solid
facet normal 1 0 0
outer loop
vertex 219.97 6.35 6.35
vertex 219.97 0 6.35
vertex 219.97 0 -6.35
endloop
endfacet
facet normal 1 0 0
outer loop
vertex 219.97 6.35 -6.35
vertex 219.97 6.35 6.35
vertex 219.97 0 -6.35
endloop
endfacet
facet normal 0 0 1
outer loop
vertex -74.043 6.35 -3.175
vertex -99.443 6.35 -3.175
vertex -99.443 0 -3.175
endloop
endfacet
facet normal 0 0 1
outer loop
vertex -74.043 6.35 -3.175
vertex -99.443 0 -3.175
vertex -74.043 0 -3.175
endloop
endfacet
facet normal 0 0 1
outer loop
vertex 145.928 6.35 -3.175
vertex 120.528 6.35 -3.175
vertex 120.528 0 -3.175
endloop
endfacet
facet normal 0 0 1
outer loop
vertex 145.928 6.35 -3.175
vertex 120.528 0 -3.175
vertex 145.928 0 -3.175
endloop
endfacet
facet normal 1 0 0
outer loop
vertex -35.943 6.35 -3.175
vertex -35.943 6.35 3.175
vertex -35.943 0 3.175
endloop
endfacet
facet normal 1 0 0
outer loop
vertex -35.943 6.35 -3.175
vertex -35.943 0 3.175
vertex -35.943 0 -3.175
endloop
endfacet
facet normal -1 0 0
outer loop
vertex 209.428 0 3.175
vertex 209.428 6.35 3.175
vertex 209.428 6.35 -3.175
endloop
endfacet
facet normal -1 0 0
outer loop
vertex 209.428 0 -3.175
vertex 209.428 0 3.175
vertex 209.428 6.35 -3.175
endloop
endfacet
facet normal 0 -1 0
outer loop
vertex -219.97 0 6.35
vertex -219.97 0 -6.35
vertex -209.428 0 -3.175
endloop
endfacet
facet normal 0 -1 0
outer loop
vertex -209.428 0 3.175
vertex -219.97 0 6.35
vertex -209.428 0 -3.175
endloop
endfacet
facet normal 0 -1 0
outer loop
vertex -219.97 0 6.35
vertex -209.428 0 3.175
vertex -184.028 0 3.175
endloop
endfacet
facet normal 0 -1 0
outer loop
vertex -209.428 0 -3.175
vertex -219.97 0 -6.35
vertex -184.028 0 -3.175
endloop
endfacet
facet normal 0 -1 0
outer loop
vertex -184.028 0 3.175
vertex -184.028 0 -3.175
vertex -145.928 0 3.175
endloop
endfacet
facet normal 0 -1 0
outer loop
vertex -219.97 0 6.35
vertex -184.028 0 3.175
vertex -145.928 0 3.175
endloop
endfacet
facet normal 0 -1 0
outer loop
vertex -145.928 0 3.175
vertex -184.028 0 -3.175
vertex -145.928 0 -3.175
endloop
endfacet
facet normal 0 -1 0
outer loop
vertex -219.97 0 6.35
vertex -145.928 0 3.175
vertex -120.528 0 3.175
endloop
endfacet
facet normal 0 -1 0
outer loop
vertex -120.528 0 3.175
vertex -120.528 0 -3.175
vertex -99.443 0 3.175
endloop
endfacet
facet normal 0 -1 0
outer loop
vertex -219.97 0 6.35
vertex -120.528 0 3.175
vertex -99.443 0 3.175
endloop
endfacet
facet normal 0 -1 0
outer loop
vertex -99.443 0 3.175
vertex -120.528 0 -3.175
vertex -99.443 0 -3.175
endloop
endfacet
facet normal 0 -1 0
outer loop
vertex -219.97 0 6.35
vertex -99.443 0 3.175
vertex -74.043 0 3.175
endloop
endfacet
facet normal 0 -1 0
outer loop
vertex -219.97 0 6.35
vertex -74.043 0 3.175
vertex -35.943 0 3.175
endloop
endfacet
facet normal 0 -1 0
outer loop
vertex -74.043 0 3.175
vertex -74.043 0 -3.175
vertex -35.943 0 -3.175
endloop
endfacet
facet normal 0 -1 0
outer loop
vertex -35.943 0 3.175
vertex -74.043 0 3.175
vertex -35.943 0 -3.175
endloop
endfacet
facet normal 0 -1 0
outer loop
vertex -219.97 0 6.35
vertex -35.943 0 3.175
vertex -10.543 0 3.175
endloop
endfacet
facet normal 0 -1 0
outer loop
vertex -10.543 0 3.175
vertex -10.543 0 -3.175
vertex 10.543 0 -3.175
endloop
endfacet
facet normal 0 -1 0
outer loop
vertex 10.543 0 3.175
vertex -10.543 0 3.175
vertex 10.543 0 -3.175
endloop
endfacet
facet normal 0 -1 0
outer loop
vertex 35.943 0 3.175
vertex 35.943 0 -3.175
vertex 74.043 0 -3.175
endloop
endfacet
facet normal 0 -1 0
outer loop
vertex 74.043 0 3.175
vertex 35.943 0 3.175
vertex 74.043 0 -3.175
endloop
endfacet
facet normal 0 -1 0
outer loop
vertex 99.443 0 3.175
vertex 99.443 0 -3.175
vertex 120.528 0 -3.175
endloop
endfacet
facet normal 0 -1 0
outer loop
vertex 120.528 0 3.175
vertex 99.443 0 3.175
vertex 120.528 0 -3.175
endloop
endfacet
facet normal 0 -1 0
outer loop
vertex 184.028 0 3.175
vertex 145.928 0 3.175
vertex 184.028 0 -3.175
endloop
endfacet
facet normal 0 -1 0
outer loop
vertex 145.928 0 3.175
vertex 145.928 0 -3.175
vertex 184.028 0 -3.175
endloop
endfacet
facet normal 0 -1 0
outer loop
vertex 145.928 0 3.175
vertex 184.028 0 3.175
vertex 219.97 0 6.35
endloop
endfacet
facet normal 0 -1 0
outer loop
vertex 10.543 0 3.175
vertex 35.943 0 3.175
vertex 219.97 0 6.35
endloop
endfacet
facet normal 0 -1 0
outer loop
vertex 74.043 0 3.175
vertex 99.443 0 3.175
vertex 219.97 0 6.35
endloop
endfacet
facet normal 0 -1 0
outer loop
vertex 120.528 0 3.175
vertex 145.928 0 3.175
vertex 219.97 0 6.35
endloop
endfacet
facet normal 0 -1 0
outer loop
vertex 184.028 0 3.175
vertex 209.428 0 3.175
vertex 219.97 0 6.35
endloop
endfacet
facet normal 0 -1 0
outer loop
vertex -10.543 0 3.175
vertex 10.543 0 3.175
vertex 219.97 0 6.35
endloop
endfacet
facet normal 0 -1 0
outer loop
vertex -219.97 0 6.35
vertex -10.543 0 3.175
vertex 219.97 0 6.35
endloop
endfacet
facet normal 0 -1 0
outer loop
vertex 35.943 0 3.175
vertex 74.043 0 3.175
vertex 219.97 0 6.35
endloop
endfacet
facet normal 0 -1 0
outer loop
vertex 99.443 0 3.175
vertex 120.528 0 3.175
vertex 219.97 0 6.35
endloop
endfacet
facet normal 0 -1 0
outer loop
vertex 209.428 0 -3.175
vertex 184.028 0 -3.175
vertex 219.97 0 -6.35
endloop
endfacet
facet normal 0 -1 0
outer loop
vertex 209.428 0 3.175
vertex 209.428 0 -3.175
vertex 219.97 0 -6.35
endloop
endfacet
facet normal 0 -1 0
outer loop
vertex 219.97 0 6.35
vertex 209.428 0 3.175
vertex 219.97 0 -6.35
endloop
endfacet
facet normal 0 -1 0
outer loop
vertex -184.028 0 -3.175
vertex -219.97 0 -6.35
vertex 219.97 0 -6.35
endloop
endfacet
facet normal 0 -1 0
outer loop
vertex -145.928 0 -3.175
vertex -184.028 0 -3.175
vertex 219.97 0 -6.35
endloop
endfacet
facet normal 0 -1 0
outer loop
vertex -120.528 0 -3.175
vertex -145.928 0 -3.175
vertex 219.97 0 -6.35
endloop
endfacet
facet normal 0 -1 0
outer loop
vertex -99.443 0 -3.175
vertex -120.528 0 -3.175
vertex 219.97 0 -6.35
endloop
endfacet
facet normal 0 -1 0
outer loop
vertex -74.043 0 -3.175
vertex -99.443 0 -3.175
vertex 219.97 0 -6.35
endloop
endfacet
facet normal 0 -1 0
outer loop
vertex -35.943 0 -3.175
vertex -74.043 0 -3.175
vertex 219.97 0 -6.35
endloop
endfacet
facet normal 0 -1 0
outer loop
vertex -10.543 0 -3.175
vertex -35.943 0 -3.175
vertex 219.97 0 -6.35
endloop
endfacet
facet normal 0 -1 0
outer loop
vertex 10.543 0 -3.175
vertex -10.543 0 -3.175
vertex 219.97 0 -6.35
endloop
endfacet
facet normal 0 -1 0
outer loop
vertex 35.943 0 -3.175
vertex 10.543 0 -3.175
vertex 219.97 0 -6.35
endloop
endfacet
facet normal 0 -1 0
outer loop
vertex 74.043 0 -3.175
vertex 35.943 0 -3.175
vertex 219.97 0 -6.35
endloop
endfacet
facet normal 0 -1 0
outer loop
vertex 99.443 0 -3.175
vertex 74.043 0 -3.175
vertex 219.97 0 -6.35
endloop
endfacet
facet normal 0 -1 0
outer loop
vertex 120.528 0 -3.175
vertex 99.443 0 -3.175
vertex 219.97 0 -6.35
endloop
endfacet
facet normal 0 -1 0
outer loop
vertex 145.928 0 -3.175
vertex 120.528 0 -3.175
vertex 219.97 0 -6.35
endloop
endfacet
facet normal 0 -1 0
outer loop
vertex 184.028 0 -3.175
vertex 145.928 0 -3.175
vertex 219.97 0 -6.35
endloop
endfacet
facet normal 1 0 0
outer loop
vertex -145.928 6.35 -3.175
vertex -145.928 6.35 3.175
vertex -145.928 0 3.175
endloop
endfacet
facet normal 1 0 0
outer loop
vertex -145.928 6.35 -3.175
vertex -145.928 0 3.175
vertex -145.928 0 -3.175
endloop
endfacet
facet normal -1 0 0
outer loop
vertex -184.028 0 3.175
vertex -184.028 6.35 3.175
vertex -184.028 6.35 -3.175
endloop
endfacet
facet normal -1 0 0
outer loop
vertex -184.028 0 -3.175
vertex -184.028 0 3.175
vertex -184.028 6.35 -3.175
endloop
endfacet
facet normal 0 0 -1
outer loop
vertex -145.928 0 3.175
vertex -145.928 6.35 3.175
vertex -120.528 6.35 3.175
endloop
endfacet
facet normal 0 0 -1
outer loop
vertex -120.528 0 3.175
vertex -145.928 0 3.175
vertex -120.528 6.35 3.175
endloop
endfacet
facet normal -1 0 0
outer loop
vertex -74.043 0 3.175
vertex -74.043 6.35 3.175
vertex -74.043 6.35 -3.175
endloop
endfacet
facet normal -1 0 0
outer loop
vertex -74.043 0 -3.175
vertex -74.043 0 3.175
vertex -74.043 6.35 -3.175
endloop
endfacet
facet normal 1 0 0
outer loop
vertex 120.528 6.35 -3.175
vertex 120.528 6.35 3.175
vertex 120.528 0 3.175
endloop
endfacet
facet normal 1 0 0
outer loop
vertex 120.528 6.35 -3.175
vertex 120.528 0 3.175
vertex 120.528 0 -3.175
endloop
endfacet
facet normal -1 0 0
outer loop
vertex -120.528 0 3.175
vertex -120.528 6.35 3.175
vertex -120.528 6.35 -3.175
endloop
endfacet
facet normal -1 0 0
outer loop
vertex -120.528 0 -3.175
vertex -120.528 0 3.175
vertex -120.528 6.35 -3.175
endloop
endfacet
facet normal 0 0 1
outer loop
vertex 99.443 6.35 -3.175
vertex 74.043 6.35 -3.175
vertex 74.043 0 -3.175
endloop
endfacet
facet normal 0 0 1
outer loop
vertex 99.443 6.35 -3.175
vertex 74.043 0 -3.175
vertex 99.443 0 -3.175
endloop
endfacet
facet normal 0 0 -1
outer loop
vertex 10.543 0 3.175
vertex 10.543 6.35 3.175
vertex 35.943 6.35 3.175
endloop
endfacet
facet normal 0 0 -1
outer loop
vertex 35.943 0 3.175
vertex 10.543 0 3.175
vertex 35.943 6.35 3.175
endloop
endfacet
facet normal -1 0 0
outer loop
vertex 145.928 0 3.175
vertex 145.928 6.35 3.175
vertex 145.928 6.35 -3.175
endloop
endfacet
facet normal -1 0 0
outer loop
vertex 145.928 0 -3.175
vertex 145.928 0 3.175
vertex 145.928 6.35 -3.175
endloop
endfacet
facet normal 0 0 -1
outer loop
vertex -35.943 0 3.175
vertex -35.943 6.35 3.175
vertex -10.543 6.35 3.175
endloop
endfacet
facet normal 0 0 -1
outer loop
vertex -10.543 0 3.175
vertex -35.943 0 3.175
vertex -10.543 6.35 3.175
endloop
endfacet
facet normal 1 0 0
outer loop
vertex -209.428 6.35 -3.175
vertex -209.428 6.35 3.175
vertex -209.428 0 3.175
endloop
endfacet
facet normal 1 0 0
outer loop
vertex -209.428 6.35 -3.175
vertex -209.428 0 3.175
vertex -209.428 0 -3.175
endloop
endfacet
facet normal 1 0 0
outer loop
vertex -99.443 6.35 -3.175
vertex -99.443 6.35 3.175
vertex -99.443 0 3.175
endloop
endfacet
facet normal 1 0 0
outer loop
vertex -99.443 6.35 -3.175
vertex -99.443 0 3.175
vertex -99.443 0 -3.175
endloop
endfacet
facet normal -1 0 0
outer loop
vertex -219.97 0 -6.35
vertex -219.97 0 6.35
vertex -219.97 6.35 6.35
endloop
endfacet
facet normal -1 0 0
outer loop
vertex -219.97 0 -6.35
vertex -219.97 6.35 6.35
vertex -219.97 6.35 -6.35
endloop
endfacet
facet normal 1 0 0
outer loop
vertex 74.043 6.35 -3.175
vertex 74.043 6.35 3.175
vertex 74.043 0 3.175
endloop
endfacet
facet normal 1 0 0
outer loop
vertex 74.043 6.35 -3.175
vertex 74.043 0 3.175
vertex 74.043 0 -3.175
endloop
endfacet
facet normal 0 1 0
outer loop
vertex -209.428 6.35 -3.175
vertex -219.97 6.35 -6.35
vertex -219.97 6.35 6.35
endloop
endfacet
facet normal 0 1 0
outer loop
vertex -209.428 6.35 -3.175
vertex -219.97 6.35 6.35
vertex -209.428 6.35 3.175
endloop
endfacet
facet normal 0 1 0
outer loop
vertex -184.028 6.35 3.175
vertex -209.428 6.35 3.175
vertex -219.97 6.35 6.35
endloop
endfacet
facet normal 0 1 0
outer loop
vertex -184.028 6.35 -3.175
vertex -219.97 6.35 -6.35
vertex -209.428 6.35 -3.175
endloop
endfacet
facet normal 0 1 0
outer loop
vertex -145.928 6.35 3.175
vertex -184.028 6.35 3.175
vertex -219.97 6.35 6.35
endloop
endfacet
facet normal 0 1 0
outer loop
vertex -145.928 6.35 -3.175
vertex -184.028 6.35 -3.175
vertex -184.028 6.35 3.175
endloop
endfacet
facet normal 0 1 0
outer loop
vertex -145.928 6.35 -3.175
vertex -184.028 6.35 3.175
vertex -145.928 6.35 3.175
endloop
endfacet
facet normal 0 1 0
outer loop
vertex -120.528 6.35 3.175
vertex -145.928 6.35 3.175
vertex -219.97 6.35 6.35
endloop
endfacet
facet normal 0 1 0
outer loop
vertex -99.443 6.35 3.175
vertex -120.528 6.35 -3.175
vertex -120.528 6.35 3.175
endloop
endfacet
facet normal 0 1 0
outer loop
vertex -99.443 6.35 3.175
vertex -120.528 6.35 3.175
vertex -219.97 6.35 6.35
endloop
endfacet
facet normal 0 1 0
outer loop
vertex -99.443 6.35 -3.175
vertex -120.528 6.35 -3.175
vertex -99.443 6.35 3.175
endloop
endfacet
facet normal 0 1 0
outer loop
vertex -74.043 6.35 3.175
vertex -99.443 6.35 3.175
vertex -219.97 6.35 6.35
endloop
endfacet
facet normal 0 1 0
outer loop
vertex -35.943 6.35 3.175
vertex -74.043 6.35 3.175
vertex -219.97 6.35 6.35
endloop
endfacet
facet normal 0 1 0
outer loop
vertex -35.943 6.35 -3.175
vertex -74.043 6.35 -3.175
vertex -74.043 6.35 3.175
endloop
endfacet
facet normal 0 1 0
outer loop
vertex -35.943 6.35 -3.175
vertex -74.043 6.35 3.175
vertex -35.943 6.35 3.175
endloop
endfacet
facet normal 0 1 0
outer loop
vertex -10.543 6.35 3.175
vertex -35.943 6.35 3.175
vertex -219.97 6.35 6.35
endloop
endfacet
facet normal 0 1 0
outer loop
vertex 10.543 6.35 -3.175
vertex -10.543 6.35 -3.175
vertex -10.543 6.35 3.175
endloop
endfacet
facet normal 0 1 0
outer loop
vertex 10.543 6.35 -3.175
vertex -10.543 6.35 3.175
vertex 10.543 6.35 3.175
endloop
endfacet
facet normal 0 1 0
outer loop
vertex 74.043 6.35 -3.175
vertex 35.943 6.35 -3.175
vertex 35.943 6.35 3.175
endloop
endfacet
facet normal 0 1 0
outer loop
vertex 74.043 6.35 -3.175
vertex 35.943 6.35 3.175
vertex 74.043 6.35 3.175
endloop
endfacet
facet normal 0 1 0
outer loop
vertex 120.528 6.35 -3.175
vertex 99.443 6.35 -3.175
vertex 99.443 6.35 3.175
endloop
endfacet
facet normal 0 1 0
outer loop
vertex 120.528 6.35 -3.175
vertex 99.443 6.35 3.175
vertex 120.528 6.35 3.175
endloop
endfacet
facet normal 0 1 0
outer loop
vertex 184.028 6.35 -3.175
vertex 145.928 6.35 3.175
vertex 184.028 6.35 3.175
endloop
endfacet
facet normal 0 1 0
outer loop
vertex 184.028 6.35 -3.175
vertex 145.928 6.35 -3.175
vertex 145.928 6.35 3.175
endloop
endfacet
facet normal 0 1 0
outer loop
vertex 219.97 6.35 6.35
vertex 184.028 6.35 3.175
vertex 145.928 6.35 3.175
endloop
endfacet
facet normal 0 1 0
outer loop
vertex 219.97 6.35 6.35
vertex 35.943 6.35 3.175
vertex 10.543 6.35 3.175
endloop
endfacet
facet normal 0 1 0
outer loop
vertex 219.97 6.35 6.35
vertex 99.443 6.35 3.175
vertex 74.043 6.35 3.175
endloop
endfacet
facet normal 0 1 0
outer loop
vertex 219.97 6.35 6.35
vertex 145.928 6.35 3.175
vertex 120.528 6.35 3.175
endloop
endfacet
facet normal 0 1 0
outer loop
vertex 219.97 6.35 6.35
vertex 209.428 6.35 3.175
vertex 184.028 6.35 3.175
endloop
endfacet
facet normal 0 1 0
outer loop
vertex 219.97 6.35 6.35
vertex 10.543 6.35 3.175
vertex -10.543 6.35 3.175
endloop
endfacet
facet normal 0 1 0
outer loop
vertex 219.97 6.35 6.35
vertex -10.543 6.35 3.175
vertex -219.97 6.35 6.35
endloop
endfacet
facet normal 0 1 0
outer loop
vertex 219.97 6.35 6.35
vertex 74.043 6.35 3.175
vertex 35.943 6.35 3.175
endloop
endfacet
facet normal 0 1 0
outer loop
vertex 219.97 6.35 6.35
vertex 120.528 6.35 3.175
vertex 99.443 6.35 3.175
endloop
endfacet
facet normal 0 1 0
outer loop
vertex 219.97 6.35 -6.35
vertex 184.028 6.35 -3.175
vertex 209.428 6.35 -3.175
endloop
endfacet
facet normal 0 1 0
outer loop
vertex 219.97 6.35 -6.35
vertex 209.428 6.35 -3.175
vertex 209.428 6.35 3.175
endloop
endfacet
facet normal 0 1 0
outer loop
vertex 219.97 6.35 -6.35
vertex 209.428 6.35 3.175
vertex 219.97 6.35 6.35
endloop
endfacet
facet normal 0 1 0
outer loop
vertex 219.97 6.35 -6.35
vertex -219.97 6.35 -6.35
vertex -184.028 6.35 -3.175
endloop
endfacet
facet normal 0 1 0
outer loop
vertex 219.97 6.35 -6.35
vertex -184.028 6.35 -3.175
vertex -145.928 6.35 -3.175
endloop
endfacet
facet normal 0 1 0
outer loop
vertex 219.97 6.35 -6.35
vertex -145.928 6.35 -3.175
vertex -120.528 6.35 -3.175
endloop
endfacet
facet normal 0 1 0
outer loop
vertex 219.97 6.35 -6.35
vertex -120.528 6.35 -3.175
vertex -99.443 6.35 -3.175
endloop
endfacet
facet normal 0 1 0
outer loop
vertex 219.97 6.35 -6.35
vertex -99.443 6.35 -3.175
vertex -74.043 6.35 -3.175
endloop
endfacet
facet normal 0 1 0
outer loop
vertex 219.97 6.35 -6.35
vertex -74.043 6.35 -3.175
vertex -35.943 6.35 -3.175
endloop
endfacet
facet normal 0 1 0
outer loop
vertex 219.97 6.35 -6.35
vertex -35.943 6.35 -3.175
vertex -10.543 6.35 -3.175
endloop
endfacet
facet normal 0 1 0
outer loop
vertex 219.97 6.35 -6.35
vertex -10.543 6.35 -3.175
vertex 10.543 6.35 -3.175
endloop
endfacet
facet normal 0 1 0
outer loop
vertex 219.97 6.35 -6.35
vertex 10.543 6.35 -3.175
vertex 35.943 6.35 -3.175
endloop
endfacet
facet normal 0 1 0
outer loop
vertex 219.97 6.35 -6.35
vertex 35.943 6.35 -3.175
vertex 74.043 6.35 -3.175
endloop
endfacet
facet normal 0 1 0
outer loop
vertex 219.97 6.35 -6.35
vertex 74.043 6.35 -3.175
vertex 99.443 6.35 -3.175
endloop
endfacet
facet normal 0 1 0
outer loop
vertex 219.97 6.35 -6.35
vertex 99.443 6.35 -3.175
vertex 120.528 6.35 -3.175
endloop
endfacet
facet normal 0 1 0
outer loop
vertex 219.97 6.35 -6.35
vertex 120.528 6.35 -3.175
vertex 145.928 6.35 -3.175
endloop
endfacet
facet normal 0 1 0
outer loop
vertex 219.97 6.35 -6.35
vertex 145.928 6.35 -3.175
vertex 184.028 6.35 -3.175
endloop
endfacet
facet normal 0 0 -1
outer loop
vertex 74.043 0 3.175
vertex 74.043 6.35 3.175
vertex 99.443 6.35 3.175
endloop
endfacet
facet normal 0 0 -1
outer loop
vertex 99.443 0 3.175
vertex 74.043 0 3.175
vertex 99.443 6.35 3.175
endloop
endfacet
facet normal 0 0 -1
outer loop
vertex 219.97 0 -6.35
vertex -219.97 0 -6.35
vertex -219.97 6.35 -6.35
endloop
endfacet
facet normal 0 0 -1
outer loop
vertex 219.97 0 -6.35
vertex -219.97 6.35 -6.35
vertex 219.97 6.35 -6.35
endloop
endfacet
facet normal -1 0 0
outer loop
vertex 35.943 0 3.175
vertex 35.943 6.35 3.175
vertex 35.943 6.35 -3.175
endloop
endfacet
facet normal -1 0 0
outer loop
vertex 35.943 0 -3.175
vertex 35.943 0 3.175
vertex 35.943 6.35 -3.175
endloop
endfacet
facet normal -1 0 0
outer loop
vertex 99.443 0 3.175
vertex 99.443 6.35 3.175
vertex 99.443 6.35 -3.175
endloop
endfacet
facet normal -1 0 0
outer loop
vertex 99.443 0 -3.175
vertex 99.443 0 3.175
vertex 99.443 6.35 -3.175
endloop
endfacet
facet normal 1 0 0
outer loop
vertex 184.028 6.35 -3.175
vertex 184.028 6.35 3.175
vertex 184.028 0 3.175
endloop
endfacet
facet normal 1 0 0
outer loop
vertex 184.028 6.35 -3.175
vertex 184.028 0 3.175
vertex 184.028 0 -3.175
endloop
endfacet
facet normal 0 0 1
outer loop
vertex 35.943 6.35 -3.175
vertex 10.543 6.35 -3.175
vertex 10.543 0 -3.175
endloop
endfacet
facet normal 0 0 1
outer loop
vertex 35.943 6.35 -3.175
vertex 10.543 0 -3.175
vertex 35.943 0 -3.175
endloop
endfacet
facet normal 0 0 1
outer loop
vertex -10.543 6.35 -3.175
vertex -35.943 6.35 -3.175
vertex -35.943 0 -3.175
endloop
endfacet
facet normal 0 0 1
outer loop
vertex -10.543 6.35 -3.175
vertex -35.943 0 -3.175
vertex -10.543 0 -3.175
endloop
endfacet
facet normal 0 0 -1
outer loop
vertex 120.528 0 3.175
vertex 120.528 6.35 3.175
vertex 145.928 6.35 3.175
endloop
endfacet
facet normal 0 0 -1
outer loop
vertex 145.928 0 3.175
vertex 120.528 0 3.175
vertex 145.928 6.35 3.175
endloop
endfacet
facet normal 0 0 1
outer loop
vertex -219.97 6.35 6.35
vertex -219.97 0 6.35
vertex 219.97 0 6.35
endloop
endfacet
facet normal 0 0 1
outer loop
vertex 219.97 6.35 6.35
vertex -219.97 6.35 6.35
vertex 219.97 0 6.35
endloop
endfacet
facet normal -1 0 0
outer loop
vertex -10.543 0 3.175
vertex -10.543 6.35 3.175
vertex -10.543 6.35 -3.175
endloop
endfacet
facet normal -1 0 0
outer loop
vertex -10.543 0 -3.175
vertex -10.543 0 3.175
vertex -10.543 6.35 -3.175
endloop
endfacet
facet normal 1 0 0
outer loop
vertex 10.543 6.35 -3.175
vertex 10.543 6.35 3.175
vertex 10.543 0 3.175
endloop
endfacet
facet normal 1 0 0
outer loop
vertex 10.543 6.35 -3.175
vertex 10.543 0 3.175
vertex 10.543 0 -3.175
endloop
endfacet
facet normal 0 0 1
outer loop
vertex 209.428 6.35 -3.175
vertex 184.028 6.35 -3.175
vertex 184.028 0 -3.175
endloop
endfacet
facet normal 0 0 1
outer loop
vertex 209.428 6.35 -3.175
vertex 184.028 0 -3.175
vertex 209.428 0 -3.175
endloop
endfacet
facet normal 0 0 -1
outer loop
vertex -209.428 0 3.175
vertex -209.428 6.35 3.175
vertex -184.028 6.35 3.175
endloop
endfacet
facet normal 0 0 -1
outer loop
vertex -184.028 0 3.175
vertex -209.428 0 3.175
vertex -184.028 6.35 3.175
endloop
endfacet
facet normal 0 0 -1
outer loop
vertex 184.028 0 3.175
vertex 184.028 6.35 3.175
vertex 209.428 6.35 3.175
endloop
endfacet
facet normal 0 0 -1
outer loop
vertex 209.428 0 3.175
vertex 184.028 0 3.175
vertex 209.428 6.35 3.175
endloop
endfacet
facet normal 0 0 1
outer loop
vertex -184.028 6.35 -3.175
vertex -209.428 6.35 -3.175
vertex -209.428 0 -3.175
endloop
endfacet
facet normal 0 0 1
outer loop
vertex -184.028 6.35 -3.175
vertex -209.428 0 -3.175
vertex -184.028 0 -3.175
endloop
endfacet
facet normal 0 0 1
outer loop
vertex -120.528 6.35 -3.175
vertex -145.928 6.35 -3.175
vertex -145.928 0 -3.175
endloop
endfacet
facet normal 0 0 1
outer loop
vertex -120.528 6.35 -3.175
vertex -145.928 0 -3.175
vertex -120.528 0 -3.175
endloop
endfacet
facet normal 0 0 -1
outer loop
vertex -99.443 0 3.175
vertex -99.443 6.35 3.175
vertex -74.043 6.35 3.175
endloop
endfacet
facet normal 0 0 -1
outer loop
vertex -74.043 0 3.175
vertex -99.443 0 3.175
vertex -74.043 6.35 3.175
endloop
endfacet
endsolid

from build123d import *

# Parameters (mm, degrees)
SKETCH1_W           = 439.940905232
SKETCH1_H           = 12.7
BOSS_EXTRUDE1_DEPTH = 6.35
SKETCH2_W           = 25.4
SKETCH2_H           = 6.35
CUT_EXTRUDE1_DEPTH  = 7.35
LPATTERN1_COUNT     = 2
LPATTERN1_PITCH     = 219.970452616
LPATTERN1_COL_COUNT = 2
LPATTERN1_COL_PITCH = 219.970452616


with BuildPart() as part:
    # Sketch1 → Boss-Extrude1 (new body)
    with BuildSketch(Plane(origin=(0, 0, 0), x_dir=(1, 0, 0), z_dir=(0, 1, 0))):
        Rectangle(SKETCH1_W, SKETCH1_H)
    extrude(amount=BOSS_EXTRUDE1_DEPTH)

    # Sketch2 → Cut-Extrude1 (cut, through all)
    with BuildSketch(Plane(origin=(0, 6.35, 0), x_dir=(1, 0, 0), z_dir=(0, 1, 0))):
        with Locations((-23.242613154, 0)):
            Rectangle(SKETCH2_W, SKETCH2_H)
        with Locations((23.242613154, 0)):
            Rectangle(SKETCH2_W, SKETCH2_H)
        with Locations((-86.742613154, 0)):
            Rectangle(SKETCH2_W, SKETCH2_H)
        with Locations((86.742613154, 0)):
            Rectangle(SKETCH2_W, SKETCH2_H)
    cut_extrude1 = extrude(amount=-CUT_EXTRUDE1_DEPTH, mode=Mode.SUBTRACT)

    # LPattern1: Cut-Extrude1 ×2
    with Locations(*[(i * LPATTERN1_PITCH, 0, 0) for i in range(1, LPATTERN1_COUNT)]):
        add(cut_extrude1, mode=Mode.SUBTRACT)

    # LPattern1 col: Cut-Extrude1 ×2
    with Locations(*[(-i * LPATTERN1_COL_PITCH, 0, 0) for i in range(1, LPATTERN1_COL_COUNT)]):
        add(cut_extrude1, mode=Mode.SUBTRACT)


solid = part.part
